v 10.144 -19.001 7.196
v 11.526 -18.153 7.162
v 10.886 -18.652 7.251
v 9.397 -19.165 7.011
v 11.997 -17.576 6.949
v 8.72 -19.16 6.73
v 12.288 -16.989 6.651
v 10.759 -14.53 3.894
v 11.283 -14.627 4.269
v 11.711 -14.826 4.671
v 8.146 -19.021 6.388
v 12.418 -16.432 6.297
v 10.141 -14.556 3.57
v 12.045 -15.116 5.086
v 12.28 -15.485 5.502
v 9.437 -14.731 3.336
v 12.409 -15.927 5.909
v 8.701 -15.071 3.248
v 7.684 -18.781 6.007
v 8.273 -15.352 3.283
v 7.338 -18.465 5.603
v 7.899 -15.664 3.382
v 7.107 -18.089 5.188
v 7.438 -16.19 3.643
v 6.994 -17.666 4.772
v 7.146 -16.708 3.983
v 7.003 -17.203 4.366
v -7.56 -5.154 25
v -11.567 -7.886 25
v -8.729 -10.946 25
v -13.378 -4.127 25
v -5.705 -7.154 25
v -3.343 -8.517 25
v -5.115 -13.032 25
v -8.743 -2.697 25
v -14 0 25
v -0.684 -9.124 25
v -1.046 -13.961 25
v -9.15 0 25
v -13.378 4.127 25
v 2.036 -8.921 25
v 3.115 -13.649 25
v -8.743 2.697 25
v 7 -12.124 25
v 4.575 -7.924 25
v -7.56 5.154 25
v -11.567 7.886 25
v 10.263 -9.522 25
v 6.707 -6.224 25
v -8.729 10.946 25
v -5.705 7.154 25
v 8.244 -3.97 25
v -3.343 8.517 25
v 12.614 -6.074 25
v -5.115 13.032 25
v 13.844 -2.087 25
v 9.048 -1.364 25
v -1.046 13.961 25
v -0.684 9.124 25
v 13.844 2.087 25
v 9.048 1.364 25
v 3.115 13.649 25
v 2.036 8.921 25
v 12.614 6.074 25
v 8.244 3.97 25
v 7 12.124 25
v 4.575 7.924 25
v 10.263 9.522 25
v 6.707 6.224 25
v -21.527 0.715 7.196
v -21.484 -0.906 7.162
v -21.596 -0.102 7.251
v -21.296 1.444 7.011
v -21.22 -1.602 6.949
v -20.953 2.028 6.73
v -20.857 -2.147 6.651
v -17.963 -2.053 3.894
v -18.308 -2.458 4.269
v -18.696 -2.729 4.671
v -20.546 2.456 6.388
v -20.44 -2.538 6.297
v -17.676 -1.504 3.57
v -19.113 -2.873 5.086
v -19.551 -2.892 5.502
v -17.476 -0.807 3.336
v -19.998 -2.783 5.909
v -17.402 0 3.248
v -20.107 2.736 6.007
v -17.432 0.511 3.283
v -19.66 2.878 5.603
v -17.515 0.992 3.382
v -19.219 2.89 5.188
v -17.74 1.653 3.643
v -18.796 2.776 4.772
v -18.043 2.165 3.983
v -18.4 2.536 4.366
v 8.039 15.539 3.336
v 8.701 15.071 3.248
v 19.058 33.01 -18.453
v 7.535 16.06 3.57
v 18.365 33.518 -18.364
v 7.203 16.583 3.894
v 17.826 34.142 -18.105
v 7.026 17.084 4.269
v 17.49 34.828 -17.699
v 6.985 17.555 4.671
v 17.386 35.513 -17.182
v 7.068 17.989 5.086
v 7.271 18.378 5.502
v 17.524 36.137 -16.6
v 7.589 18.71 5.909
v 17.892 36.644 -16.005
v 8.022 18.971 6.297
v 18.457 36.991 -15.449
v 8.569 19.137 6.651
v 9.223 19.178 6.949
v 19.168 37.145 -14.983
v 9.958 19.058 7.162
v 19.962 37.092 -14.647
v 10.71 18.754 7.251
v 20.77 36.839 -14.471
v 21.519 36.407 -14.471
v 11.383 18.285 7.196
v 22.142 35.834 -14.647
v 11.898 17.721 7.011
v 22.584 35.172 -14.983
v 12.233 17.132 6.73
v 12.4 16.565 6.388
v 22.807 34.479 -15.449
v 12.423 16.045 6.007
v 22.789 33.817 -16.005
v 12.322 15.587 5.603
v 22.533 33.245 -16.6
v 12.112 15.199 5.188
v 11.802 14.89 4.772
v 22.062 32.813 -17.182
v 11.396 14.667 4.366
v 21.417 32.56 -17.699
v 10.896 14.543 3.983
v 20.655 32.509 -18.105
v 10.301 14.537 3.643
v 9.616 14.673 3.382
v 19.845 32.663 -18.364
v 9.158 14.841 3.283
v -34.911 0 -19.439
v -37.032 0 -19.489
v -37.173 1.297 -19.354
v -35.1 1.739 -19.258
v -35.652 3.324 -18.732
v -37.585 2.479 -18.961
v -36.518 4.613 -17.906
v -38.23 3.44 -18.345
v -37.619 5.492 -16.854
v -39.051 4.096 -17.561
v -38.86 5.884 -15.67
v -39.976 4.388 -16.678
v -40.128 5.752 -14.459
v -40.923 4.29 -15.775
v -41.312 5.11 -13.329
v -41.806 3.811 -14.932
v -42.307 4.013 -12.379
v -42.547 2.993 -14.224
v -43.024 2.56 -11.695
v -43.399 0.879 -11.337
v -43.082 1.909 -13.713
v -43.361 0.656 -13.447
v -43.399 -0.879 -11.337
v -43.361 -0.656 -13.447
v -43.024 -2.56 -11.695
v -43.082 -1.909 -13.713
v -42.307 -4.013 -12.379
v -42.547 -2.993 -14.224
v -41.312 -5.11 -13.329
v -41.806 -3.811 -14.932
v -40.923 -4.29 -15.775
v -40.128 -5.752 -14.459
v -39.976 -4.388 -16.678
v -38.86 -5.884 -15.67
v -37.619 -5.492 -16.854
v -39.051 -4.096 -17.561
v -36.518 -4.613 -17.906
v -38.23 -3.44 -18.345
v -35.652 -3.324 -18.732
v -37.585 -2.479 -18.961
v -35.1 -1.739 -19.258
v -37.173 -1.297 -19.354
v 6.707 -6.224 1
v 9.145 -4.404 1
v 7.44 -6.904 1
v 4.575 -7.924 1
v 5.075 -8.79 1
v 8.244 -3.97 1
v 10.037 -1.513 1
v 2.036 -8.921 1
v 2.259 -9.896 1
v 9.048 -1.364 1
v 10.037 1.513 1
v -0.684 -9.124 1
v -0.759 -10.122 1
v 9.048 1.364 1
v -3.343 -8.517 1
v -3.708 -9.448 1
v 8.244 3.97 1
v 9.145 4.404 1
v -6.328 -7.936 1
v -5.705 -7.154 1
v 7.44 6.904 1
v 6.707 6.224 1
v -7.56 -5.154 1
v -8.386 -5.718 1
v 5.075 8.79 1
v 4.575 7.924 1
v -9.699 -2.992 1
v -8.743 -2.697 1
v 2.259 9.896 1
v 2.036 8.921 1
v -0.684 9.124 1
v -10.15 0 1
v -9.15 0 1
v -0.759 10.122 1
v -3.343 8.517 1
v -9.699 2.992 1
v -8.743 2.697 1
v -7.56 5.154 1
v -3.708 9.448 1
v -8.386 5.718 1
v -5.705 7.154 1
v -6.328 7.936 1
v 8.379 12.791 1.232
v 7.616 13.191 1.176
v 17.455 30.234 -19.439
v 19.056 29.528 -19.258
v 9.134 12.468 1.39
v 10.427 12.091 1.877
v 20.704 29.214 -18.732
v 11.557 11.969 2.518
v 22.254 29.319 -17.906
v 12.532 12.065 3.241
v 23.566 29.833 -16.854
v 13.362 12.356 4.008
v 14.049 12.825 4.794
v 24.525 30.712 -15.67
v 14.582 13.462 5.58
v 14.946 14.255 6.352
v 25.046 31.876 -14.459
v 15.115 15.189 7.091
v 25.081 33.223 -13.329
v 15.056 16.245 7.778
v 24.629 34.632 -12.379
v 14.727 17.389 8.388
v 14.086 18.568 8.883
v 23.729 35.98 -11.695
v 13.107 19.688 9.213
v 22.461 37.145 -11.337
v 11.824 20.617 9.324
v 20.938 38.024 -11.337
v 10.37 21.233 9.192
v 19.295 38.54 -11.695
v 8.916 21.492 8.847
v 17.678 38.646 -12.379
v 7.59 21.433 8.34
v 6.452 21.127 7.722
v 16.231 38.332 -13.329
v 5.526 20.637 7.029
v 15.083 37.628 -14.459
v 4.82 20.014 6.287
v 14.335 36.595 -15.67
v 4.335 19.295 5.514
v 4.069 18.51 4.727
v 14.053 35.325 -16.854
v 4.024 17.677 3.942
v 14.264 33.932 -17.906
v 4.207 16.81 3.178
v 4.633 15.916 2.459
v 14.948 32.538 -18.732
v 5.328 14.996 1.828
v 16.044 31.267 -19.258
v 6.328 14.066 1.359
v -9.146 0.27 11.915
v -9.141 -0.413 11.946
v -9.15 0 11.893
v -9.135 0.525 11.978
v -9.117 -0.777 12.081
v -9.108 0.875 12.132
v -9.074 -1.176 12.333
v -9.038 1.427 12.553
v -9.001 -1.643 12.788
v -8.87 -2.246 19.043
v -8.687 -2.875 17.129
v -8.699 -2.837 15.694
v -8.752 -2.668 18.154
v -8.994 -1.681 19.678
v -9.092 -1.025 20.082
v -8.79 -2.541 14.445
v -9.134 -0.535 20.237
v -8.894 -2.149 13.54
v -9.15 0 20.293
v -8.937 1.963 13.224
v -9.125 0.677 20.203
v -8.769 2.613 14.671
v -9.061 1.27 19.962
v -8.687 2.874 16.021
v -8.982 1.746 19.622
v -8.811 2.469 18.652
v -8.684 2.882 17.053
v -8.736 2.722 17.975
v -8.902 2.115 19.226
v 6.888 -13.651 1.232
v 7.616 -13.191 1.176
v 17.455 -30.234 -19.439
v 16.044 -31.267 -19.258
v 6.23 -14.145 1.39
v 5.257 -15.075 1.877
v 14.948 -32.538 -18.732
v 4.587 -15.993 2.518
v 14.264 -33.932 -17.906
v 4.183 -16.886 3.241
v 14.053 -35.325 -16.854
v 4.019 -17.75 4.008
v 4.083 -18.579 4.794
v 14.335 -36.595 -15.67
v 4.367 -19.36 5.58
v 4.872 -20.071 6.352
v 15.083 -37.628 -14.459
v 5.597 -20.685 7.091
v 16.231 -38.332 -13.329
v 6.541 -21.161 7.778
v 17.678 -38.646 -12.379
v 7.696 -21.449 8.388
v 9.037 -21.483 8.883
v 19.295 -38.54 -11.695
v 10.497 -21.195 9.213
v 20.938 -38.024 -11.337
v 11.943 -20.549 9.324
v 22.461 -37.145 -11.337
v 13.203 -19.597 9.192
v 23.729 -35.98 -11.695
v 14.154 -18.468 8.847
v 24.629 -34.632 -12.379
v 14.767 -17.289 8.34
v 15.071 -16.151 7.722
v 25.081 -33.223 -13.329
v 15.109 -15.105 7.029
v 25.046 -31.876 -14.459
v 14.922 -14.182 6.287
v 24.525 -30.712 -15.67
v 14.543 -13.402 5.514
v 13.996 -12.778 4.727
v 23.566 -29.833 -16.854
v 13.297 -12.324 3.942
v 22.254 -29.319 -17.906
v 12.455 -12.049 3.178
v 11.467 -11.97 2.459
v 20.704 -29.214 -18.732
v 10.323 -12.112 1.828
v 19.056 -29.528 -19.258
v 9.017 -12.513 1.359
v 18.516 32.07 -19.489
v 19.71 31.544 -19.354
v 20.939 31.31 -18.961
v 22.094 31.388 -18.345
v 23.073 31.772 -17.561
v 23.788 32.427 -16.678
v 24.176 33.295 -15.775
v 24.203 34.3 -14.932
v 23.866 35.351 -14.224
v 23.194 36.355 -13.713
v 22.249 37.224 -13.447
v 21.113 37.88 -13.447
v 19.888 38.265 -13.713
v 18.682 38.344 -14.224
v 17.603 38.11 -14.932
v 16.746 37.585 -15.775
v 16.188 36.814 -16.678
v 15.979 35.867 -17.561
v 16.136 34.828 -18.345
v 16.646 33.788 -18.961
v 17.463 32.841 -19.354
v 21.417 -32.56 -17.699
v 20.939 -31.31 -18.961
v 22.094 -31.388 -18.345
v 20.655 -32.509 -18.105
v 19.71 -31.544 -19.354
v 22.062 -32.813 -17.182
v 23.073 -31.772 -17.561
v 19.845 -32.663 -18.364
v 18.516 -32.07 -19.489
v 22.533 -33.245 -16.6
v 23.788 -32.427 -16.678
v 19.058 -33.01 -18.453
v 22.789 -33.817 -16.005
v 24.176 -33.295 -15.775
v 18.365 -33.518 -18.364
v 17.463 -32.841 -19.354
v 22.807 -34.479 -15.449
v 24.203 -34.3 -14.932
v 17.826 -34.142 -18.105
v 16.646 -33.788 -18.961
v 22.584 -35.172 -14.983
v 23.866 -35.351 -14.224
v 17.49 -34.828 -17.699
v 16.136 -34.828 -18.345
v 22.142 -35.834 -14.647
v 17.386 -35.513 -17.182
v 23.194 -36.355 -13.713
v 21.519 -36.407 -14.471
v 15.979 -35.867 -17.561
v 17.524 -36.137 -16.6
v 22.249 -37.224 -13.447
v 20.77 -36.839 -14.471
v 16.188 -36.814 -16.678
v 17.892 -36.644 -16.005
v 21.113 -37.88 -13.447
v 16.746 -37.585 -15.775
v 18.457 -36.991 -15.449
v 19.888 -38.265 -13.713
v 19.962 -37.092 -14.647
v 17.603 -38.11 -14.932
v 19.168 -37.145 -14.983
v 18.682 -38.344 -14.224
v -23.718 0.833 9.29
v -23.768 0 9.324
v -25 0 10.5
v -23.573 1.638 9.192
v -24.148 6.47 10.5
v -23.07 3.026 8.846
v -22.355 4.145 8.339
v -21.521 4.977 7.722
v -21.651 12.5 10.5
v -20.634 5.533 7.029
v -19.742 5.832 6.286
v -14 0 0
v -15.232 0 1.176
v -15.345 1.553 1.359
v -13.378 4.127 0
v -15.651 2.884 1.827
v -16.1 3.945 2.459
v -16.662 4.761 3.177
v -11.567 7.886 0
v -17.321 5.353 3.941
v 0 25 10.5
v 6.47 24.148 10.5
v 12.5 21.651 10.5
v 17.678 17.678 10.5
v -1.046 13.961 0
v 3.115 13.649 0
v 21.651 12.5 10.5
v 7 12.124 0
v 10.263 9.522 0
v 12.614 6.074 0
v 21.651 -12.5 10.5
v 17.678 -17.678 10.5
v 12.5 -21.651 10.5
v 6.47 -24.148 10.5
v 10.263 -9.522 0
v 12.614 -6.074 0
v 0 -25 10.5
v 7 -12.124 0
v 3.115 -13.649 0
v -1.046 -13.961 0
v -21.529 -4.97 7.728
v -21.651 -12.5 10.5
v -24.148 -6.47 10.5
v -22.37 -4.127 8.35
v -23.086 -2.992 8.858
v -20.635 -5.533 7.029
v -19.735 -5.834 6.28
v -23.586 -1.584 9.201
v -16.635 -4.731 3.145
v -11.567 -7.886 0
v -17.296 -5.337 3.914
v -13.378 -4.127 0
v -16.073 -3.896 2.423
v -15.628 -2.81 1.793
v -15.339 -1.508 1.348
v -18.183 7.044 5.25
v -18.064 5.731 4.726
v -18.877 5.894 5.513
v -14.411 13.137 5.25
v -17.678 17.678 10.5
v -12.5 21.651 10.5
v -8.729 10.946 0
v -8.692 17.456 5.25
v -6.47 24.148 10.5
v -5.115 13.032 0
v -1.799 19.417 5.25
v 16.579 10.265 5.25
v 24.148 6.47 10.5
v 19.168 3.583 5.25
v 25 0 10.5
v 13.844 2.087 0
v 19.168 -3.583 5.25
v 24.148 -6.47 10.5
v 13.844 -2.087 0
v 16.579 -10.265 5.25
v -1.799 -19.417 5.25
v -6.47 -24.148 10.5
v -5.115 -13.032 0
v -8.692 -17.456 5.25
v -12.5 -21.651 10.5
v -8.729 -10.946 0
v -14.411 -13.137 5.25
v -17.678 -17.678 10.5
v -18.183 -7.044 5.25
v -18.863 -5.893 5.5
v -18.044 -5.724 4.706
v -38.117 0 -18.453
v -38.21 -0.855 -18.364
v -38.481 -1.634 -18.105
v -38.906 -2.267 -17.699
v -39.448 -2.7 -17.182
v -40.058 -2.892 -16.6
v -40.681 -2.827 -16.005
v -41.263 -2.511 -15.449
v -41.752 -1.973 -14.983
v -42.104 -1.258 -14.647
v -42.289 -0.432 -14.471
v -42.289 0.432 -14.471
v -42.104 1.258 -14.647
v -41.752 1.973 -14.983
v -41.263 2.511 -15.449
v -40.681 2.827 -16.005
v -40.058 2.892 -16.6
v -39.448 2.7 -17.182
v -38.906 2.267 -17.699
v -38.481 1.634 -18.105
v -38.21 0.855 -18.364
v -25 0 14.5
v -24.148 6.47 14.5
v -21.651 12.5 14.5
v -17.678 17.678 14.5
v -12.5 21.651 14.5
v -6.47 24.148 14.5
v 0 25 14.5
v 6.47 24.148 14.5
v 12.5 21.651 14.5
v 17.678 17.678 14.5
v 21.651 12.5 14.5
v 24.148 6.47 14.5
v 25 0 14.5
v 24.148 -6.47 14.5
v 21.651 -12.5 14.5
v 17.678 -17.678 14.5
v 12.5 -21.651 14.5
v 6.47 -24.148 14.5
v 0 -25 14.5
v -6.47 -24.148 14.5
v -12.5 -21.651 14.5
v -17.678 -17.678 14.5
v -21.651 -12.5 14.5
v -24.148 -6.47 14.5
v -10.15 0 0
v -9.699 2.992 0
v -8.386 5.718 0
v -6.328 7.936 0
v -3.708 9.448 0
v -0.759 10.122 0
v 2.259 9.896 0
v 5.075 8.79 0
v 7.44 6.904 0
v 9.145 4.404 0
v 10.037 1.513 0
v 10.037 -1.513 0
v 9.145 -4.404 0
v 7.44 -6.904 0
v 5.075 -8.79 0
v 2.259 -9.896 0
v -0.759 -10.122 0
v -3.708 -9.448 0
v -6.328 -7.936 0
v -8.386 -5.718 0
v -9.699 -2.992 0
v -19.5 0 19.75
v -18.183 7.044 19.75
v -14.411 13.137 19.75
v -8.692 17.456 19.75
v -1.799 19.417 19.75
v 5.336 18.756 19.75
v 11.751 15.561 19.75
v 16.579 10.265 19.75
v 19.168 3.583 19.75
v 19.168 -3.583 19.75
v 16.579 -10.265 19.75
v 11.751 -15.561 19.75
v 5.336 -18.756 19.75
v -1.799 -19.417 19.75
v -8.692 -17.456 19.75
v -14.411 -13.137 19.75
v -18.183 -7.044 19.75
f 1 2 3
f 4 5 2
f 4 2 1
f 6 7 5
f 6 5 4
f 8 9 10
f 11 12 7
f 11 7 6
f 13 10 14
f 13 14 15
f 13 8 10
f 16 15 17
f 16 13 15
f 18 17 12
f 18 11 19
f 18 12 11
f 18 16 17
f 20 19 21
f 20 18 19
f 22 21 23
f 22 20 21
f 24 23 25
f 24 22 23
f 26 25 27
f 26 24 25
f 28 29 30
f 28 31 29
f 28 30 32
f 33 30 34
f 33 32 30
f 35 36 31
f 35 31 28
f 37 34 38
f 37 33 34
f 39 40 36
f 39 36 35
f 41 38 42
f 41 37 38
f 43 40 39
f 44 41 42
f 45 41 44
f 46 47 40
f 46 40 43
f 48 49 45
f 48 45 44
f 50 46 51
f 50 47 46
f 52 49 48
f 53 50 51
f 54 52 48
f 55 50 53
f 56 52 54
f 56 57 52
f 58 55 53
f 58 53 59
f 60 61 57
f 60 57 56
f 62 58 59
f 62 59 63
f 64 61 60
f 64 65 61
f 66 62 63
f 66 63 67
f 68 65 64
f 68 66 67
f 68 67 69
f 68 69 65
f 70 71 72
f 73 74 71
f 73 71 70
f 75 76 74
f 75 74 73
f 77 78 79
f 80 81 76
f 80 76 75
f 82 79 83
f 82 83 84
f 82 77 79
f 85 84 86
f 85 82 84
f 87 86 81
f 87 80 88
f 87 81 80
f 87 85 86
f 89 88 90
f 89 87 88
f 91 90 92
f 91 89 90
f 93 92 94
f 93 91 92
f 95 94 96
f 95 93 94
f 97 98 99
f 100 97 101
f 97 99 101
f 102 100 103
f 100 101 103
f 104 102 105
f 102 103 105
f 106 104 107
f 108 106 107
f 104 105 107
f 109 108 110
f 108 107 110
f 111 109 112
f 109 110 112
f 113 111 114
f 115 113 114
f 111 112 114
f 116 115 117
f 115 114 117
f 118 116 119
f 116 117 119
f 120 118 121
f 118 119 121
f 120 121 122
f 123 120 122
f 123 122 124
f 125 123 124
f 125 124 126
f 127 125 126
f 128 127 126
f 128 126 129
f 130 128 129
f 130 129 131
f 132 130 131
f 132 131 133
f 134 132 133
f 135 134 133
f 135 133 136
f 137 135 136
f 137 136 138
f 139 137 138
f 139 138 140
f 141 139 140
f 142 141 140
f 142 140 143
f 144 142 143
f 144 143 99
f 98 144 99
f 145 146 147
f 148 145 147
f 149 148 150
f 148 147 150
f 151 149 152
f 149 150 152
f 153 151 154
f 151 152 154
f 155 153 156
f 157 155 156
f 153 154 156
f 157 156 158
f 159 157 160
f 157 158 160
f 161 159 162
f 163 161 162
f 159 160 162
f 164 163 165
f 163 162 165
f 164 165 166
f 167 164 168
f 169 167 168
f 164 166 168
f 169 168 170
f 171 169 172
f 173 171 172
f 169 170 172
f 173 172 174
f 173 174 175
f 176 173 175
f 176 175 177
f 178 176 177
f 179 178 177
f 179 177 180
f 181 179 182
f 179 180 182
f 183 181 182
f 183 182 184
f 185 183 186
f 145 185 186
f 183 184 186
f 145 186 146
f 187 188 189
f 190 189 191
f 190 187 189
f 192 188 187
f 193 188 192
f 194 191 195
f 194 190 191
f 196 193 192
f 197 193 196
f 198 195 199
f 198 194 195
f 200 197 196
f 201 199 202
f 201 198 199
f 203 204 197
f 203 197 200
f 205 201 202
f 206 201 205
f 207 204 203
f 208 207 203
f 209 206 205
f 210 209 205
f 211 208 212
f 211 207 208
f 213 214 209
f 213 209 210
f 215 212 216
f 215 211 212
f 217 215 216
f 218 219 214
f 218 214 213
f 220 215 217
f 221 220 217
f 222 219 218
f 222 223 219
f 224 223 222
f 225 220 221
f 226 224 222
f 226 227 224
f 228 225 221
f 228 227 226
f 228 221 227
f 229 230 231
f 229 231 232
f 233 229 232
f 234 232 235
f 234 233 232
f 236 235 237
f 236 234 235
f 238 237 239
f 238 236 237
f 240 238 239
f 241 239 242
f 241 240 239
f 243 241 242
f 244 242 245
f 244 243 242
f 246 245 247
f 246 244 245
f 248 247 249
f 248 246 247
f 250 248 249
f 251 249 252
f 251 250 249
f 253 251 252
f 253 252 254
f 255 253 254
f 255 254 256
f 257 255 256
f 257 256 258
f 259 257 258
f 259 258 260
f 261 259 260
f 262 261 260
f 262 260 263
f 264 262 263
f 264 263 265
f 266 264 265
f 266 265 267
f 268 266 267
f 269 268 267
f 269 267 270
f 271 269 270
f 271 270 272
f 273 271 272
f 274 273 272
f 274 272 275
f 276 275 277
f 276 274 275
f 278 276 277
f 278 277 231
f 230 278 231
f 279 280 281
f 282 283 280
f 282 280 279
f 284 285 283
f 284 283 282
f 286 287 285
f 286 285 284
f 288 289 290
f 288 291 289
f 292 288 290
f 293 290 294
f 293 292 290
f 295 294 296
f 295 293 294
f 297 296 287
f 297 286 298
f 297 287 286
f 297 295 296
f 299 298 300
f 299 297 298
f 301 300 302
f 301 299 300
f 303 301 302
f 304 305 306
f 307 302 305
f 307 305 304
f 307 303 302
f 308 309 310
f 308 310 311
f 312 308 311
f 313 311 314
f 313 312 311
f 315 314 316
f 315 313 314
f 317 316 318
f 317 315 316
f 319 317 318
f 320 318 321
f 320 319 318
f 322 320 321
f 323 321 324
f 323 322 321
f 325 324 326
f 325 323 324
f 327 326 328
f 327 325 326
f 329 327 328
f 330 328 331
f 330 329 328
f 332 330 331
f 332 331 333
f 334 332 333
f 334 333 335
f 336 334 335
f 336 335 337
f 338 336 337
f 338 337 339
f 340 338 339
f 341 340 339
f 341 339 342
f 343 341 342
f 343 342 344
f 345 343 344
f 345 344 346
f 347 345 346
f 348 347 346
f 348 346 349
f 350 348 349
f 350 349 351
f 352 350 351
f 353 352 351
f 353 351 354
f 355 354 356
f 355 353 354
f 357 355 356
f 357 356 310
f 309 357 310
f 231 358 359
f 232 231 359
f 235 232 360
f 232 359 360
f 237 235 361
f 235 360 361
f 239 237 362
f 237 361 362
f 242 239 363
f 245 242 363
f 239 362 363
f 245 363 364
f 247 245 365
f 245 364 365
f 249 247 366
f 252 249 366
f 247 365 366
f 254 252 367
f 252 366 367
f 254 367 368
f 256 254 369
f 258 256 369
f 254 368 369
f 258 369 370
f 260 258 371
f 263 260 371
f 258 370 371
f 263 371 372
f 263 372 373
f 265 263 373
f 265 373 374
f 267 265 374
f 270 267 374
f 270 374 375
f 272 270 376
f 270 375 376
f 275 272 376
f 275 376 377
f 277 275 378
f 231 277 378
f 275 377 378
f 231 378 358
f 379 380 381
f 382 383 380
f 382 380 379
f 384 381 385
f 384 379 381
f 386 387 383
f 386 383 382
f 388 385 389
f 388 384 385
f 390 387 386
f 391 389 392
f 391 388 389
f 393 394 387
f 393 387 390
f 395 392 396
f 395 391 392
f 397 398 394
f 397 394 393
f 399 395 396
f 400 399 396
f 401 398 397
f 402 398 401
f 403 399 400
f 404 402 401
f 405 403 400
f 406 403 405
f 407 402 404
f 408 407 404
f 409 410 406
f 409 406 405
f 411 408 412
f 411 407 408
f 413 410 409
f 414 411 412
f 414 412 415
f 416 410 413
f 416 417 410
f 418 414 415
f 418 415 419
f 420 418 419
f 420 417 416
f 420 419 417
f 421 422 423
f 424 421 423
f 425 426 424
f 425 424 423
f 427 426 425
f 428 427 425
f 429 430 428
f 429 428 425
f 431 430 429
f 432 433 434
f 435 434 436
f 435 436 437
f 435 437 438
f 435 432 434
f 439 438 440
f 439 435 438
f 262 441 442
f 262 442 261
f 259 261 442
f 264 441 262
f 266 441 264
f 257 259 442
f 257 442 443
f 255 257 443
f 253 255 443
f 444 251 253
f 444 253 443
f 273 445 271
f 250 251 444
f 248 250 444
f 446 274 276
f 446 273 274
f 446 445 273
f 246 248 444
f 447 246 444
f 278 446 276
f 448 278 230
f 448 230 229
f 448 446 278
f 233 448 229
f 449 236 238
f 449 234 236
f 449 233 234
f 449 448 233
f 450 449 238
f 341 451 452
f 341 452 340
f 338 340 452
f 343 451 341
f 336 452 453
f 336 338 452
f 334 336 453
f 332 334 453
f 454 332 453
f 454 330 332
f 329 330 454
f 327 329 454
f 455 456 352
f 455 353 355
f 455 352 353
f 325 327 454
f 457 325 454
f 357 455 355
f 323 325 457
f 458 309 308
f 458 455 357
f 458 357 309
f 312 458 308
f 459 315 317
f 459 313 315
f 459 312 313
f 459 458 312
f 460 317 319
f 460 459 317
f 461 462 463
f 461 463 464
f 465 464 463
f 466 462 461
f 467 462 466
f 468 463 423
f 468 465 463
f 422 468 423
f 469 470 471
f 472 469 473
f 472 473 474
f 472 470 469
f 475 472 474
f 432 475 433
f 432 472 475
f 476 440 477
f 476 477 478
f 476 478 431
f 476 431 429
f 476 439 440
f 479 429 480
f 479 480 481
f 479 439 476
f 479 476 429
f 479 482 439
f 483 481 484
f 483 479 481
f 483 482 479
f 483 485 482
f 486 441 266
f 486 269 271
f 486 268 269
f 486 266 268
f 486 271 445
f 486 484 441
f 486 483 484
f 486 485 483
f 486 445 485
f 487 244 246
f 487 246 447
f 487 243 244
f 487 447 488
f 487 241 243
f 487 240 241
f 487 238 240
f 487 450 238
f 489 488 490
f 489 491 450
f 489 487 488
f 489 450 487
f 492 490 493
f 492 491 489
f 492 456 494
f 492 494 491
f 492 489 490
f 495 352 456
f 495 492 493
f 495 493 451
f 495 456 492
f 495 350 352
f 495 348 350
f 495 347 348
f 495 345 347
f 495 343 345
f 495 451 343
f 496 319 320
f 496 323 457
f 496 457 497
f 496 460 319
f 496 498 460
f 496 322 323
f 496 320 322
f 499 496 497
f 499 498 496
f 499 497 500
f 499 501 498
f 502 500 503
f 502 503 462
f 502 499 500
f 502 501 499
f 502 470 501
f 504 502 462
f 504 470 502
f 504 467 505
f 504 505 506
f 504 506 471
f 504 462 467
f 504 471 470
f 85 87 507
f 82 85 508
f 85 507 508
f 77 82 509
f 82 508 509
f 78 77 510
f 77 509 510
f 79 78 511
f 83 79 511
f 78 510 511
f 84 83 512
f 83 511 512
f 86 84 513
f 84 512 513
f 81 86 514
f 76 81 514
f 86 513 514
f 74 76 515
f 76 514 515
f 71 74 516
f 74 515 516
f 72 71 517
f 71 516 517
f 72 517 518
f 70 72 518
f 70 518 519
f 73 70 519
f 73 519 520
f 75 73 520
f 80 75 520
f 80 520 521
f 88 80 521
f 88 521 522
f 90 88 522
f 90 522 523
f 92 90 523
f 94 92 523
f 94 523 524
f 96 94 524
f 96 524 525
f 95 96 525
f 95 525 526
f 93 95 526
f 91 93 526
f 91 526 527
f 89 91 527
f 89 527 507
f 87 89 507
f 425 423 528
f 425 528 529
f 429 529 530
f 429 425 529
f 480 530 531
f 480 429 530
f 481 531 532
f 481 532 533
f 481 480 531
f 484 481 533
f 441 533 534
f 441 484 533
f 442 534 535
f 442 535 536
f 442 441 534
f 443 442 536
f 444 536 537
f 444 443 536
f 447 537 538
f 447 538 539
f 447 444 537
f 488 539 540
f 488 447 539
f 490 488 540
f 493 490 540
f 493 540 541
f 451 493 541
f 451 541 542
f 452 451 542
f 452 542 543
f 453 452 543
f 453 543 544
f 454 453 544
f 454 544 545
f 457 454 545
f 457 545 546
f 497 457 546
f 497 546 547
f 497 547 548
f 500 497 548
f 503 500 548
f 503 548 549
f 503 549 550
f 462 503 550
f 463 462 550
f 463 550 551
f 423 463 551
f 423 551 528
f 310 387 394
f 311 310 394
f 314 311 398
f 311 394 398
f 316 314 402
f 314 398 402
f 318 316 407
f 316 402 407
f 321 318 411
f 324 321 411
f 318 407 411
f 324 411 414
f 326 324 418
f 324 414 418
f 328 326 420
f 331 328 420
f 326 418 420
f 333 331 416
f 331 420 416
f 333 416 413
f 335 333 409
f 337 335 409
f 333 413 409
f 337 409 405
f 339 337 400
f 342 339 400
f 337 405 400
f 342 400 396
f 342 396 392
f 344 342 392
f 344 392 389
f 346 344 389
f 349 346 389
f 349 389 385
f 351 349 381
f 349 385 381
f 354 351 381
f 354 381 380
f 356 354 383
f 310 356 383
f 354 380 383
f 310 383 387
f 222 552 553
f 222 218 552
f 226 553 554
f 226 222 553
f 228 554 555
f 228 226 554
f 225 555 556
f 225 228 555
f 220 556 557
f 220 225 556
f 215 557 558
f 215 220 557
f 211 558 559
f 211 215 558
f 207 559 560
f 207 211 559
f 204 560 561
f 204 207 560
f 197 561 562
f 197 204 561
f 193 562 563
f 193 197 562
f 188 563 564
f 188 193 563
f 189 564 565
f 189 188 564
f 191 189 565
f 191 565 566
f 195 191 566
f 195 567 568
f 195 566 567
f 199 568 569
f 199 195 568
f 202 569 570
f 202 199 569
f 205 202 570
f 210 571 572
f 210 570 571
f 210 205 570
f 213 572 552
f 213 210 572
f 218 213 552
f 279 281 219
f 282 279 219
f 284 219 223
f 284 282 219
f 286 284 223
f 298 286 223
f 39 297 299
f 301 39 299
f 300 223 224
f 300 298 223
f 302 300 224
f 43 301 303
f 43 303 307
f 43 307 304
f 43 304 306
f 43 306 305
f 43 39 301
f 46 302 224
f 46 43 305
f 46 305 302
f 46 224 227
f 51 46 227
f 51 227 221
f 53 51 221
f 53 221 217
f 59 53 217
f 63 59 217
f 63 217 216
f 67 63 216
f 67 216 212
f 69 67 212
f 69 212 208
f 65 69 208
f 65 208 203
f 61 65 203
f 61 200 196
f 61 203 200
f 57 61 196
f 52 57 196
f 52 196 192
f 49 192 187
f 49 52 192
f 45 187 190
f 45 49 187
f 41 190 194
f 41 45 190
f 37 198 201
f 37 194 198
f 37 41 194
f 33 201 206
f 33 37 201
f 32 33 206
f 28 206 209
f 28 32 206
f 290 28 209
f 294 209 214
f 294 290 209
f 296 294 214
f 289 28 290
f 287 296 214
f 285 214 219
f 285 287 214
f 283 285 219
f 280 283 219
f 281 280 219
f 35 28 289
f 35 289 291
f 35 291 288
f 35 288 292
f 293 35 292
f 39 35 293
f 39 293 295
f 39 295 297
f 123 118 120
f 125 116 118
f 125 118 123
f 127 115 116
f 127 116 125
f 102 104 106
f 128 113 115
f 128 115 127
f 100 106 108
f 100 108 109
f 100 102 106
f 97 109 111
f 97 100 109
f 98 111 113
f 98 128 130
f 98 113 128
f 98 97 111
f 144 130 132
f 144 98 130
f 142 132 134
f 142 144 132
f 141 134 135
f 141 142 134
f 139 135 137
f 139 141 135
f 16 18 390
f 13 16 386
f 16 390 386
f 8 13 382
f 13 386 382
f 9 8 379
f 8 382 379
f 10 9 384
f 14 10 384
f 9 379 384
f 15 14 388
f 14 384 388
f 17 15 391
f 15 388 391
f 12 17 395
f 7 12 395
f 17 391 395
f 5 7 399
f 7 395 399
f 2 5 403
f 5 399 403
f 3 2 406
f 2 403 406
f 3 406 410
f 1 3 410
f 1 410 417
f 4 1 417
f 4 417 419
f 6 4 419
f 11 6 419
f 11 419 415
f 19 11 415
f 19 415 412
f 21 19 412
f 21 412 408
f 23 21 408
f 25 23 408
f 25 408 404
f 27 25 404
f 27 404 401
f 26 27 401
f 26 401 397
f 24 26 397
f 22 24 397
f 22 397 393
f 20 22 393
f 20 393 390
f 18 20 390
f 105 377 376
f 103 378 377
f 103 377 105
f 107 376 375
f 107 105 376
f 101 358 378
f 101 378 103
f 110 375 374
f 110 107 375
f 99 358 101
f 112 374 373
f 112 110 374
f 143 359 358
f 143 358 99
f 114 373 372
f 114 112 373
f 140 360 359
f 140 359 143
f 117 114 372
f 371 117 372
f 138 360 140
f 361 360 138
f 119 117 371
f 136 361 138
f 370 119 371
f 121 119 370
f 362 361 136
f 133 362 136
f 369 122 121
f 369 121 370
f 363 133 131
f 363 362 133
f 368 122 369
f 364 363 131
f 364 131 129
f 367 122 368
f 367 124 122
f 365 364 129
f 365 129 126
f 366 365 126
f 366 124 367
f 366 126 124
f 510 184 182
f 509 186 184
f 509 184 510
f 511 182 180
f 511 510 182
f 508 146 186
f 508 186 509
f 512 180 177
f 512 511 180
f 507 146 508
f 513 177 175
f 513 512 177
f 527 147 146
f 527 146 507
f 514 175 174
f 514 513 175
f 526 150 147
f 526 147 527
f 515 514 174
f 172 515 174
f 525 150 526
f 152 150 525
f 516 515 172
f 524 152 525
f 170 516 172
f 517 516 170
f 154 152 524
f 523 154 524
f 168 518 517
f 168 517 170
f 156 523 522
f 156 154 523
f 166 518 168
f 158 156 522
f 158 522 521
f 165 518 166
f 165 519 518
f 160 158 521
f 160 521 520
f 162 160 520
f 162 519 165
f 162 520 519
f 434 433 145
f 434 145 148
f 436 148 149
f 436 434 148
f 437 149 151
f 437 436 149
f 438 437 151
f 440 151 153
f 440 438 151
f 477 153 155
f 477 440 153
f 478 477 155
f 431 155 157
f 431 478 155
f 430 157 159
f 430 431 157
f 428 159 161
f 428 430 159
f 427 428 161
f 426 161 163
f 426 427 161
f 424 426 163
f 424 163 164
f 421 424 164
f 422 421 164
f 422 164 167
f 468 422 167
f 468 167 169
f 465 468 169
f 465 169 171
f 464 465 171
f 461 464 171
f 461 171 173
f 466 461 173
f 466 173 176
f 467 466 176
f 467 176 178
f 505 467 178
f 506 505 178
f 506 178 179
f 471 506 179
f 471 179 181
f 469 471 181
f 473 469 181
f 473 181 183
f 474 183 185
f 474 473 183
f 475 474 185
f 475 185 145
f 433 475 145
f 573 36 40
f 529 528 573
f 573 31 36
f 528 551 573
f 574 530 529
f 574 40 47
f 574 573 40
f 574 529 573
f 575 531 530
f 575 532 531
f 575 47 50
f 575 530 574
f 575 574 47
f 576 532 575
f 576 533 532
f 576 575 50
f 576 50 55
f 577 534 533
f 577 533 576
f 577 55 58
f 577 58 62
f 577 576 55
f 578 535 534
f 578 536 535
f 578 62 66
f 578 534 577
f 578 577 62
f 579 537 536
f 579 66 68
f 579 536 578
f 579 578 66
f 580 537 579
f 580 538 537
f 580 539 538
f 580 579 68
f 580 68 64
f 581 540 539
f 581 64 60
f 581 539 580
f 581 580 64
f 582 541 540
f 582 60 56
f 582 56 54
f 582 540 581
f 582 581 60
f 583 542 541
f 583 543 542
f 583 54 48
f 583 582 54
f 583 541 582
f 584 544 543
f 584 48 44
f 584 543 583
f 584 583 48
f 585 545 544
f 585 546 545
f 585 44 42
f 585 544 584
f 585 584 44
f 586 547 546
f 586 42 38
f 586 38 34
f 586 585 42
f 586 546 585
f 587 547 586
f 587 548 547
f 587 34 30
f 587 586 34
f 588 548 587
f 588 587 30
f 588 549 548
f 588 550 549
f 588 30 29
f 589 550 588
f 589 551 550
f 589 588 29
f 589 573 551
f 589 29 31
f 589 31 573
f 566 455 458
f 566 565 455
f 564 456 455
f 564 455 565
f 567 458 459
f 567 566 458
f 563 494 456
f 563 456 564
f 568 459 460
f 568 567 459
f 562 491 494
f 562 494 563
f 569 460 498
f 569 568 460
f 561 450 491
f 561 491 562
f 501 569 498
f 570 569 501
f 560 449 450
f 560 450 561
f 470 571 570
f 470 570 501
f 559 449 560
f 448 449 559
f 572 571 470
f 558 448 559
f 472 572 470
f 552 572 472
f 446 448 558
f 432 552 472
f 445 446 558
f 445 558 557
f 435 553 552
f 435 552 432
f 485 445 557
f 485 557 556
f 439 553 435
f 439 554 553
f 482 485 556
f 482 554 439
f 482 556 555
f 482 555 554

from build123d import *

# Parameters (mm, degrees)
F4_R     = 2.9
F5_DEPTH = 75.0134427933
F6_SIZE  = 1.5
F7_COUNT = 3


with BuildPart() as f1:
    # F0 (on Front) → F1 (revolve)
    with BuildSketch(Plane.XZ):
        Polygon((-9.15, 1), (-9.15, 25), (-14, 25), (-25, 14.5), (-25, 10.5), (-14, 0), (-10.15, 0), (-10.15, 1), align=None)
    revolve(axis=Axis((0, 0, 12.5), (0, 0, -1)))

    # F2 (on Front) → F3 (revolve)
    with BuildSketch(Plane.XZ):
        Polygon((-35.94647469, -20.5244732297), (-15.2322022896, 1.1761930946), (-10.7806652787, 5.8397080583), (-15.0484629892, 9.9135149637), (-19.5, 5.25), (-40.2142724005, -16.4506663243), align=None)
    revolve(axis=Axis((-29.8571362002, 0, -5.6003331622), (0.6904757467, 0, 0.7233555441)))

    # F4 (on face) → F5 (cut, through all)
    with BuildSketch(Plane(origin=(-27.3888669951, 0, -28.6930987567), x_dir=(0.7233555441, 0, -0.6904757467), z_dir=(-0.6904757467, 0, -0.7233555441))):
        with Locations((-17.7304307809, 0)):
            Circle(F4_R)
    extrude(amount=-F5_DEPTH, mode=Mode.SUBTRACT)

    # F6
    f6_edges = [f1.edges().sort_by_distance(p)[0] for p in [
        (-44.48207, 0, -12.376859),
    ]]
    chamfer(f6_edges, length=F6_SIZE)

    # F7: F1 ×3 about axis
    f7_axis = Axis((0, 0, 14.5), (0, 0, -1))


with BuildPart() as f1_1:
    add(f1.part)
    for i in range(1, F7_COUNT):
        add(f1.part.rotate(f7_axis, i * 360 / F7_COUNT))


solid = f1_1.part
